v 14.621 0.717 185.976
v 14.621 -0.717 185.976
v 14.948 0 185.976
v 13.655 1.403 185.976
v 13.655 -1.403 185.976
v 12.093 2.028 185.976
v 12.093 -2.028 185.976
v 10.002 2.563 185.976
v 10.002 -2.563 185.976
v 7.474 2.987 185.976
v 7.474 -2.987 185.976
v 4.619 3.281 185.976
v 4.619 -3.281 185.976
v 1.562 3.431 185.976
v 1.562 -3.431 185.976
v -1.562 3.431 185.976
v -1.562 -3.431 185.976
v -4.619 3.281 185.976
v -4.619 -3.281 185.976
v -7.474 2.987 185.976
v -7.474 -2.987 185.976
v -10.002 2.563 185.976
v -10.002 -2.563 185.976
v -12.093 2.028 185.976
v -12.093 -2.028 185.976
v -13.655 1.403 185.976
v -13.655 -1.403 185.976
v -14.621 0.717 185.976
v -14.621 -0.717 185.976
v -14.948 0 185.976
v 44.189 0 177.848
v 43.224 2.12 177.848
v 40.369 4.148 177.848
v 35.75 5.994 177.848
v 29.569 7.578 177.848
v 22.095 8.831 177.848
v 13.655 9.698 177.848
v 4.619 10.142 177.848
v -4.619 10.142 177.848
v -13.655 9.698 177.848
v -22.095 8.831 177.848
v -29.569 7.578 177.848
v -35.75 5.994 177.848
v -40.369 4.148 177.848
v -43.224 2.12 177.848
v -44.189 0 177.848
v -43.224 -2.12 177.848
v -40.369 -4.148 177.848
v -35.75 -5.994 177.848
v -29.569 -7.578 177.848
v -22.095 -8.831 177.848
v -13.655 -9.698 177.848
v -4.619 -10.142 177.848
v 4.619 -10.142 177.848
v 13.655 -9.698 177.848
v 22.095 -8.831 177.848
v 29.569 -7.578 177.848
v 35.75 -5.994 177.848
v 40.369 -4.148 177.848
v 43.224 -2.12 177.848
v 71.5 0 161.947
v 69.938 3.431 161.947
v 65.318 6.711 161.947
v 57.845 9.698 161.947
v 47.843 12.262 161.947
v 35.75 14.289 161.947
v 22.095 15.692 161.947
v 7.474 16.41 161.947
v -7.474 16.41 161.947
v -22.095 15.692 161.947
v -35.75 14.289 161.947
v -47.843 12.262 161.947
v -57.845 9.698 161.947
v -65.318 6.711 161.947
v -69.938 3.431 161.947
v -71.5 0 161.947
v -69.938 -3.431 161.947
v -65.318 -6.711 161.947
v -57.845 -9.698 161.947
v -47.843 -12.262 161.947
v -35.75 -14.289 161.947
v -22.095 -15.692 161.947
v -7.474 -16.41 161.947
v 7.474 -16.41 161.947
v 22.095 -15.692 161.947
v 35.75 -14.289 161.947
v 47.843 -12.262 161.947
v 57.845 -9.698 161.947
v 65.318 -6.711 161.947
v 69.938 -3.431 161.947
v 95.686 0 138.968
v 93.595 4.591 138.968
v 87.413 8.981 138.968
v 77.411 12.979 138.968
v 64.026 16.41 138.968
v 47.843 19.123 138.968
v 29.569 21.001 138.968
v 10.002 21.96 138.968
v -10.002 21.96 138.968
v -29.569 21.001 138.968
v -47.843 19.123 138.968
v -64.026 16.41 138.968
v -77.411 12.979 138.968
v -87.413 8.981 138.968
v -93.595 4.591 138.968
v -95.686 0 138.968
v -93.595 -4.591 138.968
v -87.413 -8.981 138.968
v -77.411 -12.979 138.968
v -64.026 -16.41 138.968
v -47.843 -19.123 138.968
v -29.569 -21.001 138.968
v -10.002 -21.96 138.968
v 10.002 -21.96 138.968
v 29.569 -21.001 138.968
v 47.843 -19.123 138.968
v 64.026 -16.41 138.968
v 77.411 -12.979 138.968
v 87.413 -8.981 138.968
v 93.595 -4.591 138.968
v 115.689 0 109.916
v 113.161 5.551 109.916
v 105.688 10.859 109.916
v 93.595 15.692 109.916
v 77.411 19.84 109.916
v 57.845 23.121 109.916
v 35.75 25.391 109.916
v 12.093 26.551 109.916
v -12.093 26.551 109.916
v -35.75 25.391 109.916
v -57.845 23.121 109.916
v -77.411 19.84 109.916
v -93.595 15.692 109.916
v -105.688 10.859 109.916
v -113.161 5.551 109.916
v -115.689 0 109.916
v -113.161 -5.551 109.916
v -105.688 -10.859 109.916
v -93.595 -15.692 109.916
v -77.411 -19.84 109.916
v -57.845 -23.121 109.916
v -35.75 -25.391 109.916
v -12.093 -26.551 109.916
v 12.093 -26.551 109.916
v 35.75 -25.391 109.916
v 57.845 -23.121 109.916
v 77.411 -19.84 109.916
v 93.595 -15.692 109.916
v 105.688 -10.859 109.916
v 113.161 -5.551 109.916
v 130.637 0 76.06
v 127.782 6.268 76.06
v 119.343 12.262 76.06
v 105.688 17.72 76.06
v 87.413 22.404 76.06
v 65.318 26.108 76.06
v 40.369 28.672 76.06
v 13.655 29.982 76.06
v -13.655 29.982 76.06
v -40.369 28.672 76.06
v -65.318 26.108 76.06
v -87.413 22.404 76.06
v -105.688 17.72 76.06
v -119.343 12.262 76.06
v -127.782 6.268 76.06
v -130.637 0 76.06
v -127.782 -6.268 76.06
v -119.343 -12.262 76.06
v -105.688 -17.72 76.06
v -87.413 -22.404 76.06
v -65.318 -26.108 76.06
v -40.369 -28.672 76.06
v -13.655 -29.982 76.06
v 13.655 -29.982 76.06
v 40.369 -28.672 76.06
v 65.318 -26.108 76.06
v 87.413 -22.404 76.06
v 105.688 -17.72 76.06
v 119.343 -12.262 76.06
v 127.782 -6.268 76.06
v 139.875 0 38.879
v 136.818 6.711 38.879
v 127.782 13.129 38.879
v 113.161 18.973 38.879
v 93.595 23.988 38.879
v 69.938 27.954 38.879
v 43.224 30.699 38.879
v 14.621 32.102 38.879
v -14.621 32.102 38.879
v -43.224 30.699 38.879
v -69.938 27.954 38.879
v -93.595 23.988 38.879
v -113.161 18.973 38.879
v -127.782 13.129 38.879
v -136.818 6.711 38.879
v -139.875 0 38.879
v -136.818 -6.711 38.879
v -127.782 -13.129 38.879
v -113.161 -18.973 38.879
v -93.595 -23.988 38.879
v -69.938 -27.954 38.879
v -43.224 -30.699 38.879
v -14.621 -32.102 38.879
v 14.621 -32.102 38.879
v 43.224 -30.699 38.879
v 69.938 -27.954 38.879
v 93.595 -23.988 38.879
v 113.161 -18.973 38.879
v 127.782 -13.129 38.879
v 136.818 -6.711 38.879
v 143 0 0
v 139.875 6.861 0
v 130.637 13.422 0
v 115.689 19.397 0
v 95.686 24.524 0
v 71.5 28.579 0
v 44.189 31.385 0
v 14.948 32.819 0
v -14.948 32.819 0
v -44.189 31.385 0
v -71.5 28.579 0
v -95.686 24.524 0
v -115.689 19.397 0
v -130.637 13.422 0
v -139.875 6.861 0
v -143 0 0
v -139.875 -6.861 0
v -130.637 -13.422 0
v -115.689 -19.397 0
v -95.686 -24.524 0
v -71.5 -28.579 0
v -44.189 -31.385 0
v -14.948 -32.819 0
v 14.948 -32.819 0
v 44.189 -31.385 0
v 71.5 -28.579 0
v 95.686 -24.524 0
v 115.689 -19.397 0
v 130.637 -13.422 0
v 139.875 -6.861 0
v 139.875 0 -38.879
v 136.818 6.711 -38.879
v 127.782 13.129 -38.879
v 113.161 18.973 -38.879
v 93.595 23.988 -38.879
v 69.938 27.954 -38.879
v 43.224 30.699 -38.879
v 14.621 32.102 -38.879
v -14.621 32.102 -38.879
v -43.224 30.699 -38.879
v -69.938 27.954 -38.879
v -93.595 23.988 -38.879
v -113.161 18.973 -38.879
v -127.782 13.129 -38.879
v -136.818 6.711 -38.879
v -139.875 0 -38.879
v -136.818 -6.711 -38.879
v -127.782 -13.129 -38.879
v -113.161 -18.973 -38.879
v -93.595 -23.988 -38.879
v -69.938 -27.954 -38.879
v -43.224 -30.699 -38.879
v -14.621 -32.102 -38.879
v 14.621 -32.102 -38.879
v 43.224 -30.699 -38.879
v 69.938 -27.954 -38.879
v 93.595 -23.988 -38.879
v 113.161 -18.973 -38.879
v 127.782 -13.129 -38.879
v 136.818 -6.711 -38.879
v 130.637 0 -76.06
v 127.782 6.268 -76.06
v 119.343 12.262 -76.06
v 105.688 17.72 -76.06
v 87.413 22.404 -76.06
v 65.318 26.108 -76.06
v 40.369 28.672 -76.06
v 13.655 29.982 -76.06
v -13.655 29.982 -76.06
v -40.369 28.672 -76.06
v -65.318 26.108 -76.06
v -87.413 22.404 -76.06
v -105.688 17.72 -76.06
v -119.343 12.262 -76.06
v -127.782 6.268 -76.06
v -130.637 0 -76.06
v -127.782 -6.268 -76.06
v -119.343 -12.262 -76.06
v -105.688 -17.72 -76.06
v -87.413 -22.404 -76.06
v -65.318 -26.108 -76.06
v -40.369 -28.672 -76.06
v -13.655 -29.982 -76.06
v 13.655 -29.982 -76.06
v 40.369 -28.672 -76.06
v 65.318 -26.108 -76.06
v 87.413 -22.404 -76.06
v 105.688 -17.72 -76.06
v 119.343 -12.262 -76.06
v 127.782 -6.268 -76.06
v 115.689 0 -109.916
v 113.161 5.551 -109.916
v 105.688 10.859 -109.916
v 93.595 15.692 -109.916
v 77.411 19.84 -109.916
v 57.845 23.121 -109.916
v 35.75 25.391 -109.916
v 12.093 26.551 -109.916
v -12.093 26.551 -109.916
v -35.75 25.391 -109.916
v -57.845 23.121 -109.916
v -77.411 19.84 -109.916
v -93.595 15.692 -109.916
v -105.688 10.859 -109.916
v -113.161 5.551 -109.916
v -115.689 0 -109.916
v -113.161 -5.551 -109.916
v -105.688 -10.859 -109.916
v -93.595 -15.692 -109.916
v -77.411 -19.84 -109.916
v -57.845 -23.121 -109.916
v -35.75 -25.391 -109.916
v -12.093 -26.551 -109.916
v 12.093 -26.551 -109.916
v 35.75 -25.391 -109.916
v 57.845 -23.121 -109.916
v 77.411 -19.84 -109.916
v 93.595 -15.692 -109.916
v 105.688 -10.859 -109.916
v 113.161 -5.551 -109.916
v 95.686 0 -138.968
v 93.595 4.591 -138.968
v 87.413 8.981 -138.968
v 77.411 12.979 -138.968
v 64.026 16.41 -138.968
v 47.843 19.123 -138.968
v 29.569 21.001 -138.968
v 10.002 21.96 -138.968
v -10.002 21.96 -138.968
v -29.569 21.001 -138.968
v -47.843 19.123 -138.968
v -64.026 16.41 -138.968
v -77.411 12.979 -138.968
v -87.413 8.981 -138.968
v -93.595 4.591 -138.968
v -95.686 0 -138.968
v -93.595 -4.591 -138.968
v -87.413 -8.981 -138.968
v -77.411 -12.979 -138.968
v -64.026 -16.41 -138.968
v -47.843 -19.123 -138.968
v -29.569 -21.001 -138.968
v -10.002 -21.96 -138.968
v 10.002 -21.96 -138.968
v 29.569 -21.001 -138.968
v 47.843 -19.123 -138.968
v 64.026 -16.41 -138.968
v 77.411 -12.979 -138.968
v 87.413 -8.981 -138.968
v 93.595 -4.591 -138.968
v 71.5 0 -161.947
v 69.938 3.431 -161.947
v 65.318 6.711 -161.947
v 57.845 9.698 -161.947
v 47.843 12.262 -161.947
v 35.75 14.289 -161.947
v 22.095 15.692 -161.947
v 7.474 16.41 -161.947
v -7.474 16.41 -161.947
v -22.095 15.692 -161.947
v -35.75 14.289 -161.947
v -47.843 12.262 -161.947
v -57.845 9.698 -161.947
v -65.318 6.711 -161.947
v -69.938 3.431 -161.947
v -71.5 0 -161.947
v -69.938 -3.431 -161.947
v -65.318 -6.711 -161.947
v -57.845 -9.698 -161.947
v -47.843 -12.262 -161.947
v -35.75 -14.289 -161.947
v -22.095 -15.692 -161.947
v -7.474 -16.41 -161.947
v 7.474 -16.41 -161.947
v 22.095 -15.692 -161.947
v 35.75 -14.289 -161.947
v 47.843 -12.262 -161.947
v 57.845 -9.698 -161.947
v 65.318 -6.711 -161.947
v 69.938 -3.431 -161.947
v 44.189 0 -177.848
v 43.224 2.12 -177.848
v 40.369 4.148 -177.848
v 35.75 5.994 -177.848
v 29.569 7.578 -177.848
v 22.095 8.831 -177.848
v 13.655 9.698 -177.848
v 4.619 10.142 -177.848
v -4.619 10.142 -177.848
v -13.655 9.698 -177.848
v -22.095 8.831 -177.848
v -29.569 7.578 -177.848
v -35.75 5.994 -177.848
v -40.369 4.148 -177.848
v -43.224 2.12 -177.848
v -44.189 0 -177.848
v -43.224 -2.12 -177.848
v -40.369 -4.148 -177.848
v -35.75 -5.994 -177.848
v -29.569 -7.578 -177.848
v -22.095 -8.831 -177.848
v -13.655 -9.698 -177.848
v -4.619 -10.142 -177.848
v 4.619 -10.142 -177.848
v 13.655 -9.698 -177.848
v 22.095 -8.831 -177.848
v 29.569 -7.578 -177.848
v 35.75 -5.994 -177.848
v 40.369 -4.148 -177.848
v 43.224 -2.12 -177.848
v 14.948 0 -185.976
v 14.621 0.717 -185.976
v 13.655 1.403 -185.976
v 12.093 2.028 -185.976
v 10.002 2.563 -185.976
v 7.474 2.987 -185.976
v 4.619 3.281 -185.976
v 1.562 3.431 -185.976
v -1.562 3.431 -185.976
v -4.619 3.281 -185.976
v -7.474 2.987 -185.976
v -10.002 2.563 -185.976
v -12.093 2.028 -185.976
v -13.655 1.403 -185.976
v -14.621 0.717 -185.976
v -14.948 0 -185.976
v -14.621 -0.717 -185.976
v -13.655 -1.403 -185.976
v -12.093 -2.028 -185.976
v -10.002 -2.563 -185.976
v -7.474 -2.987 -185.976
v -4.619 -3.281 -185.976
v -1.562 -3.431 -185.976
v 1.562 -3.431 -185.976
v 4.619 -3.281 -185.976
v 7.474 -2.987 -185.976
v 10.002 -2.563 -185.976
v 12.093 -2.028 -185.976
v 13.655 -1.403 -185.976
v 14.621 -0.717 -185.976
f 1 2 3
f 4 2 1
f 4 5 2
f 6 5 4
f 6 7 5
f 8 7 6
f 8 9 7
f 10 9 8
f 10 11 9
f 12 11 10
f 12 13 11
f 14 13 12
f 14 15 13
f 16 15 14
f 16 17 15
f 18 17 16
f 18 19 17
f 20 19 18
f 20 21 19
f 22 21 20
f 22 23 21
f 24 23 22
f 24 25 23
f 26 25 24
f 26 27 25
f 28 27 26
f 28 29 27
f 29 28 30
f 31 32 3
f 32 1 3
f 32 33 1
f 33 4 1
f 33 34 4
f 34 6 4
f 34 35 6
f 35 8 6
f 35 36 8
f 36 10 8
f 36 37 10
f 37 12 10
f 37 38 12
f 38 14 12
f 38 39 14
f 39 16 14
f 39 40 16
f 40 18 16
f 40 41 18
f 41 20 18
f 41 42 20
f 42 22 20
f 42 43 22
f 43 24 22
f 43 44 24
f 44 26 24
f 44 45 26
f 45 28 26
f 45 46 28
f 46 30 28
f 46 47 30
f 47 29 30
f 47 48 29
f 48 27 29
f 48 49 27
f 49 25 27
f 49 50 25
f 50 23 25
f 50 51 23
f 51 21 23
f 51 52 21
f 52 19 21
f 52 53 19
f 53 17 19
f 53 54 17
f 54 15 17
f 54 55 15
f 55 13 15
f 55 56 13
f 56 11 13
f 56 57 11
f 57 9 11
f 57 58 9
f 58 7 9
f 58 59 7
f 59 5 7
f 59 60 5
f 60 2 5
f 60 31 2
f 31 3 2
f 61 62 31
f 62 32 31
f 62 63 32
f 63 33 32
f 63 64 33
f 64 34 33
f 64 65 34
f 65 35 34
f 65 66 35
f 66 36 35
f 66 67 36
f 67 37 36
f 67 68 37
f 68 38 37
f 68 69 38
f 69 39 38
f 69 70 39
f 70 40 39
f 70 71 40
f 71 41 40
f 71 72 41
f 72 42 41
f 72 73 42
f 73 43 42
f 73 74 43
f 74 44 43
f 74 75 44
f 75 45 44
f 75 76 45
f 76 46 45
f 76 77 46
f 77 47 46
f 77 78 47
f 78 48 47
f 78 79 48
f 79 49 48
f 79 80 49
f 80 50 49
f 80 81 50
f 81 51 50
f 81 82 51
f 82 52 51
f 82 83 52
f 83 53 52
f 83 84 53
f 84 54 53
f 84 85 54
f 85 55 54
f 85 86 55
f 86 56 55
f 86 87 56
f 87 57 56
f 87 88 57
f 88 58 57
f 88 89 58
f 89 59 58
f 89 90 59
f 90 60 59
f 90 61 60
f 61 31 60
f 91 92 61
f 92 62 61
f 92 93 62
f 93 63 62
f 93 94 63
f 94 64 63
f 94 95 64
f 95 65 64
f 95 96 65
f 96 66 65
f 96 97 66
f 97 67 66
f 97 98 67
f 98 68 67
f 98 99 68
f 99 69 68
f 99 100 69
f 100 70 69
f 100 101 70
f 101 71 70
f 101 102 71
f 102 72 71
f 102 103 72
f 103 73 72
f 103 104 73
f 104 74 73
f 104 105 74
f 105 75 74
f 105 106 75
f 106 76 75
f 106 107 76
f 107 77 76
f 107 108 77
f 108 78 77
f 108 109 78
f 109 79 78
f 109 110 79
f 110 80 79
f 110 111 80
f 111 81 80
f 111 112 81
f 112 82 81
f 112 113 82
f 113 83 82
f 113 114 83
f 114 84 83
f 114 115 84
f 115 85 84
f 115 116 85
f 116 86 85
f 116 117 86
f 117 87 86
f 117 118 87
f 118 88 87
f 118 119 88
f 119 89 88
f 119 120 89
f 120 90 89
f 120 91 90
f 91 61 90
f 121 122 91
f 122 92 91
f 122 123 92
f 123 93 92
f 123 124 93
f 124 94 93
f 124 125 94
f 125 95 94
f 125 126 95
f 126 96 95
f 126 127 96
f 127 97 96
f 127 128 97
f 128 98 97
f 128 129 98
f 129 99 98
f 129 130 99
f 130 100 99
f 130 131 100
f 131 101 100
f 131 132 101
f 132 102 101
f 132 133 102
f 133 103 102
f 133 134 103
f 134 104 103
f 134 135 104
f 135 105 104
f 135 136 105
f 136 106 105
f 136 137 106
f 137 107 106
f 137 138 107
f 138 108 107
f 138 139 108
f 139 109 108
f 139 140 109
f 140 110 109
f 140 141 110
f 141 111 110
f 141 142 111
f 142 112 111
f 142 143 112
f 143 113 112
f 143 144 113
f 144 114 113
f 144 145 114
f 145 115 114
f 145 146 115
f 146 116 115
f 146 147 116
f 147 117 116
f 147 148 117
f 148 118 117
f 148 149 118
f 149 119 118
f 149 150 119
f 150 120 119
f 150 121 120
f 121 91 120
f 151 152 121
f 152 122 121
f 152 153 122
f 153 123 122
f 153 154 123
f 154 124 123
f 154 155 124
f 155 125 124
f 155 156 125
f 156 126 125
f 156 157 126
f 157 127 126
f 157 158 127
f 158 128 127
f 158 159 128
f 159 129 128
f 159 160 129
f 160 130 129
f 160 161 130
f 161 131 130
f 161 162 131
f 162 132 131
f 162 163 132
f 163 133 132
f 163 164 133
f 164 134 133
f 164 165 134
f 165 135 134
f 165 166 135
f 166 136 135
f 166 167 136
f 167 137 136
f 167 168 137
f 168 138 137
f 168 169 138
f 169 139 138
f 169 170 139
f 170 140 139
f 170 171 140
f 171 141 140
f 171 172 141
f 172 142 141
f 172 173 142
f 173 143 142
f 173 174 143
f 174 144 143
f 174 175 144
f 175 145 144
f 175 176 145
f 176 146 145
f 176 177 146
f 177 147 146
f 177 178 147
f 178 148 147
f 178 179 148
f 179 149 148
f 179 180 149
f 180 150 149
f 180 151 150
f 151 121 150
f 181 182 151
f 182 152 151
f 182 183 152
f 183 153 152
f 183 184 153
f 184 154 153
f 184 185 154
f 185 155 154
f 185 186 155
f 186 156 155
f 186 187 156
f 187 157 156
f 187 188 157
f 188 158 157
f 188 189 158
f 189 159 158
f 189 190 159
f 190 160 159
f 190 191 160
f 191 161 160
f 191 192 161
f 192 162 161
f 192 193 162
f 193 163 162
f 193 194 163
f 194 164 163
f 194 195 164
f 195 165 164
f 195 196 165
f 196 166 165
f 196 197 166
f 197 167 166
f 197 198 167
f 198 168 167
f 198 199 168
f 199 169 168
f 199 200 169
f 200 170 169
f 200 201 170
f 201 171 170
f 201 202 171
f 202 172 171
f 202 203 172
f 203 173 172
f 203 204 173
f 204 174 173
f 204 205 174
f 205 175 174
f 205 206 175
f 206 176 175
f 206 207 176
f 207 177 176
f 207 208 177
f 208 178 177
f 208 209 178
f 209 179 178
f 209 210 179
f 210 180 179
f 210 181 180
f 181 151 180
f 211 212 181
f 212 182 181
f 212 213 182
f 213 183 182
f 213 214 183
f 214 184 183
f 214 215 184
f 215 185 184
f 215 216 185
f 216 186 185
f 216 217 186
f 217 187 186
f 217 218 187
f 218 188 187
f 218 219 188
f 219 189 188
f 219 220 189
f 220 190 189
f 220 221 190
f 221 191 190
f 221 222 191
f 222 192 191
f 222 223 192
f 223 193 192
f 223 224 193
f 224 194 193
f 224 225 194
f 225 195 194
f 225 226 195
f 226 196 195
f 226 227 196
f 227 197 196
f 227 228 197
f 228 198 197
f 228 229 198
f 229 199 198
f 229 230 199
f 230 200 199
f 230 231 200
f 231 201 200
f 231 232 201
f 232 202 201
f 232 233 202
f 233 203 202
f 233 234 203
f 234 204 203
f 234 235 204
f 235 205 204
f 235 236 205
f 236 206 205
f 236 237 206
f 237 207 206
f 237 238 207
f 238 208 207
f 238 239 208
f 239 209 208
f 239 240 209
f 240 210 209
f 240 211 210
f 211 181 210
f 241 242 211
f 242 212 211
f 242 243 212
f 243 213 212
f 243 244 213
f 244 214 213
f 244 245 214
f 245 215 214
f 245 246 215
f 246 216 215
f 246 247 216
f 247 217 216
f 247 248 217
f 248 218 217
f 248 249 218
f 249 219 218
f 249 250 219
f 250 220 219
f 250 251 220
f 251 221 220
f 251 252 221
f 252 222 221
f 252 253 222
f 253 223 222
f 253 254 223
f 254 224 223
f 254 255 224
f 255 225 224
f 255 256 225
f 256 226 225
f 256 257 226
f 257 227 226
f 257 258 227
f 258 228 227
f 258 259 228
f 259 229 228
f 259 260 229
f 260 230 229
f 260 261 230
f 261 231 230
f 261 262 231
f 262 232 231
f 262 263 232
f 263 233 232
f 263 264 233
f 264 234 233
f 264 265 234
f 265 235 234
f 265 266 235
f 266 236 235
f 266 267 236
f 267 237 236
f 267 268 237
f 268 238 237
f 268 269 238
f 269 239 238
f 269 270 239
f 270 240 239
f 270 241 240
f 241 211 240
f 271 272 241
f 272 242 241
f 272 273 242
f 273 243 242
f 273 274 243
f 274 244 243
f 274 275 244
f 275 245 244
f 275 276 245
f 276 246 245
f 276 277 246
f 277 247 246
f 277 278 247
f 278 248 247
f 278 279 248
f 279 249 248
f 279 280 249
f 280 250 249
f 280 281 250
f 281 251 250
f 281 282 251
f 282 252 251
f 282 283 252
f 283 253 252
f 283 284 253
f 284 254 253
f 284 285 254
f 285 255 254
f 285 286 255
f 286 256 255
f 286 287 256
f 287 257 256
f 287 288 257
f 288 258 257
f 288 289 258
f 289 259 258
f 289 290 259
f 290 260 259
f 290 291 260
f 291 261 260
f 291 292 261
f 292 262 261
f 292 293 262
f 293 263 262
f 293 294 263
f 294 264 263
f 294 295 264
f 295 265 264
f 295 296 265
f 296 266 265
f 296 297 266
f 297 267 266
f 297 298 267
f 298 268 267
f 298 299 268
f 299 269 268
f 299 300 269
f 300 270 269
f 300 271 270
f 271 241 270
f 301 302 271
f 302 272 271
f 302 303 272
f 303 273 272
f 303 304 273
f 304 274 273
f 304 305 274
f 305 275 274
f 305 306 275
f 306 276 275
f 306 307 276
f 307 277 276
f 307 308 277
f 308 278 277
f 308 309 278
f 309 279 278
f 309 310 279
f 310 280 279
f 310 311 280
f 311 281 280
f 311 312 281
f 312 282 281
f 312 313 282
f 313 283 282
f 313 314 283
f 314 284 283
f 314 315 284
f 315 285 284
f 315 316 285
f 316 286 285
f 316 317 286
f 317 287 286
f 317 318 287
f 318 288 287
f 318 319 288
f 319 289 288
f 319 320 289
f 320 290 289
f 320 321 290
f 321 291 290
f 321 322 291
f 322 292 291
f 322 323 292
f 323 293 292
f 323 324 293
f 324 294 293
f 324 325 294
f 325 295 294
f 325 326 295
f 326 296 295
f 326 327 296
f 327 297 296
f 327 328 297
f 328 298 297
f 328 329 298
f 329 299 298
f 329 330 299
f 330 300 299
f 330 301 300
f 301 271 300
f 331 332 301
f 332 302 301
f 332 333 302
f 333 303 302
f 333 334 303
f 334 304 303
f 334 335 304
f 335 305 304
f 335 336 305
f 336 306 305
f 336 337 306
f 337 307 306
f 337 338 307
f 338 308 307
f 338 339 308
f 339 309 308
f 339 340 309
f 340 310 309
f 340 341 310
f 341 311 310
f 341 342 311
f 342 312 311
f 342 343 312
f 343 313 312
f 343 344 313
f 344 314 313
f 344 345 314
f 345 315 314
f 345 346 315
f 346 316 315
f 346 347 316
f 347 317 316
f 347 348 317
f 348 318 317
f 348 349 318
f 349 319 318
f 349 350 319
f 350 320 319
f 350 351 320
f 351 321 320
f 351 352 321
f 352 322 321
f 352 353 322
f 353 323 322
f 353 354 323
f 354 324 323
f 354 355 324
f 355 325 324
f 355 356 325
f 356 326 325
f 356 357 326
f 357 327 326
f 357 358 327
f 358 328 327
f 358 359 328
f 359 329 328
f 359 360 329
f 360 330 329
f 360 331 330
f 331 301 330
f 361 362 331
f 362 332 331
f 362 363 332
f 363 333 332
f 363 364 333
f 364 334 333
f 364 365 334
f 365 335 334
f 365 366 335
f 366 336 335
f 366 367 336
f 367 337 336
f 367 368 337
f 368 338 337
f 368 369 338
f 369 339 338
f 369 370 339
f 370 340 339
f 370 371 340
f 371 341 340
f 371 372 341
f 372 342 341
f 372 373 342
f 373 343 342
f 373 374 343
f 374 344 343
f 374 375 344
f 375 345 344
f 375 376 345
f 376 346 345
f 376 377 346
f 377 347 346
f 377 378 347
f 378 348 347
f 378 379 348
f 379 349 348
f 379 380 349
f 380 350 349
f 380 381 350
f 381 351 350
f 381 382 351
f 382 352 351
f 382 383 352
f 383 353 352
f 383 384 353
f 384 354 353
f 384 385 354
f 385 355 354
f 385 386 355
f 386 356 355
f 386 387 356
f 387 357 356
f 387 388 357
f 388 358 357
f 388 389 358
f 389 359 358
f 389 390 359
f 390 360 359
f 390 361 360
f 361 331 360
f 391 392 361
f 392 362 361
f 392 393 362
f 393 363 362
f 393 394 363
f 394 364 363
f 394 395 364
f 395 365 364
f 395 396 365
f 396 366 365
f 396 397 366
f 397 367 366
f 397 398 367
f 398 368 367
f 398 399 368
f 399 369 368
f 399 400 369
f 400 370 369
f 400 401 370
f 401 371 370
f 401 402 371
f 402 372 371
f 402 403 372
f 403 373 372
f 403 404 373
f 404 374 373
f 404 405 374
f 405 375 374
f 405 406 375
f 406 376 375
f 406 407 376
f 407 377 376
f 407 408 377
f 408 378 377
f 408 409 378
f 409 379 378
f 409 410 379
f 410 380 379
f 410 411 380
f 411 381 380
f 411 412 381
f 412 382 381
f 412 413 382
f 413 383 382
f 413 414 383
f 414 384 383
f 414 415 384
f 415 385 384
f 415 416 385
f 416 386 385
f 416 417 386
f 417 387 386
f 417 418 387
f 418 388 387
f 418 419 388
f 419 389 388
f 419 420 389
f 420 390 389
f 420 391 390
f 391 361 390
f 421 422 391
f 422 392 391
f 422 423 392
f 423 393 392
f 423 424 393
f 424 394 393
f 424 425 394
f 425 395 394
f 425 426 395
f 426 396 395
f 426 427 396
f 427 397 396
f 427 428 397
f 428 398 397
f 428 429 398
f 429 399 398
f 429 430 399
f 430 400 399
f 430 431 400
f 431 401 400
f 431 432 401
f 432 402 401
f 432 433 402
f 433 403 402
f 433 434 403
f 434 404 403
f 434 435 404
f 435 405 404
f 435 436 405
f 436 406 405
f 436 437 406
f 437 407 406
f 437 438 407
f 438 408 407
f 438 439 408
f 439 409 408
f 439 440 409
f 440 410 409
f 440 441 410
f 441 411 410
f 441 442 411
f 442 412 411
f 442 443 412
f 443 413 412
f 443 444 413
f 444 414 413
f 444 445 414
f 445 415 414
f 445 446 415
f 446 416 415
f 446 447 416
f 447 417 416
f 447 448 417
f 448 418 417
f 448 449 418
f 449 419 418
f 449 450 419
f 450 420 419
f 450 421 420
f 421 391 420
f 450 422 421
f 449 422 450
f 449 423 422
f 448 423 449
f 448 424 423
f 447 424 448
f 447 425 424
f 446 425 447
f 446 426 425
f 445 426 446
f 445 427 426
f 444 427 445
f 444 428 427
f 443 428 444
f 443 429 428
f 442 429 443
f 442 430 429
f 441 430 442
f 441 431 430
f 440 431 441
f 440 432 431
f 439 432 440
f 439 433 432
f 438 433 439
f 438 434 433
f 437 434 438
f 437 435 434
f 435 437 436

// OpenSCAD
// Generated by SolidPython 1.0.1 on 2020-07-29 00:46:50


scale(v = [13, 3, 17]) {
	sphere(r = 11);
}
/***********************************************
*********      SolidPython code:      **********
************************************************
 
# import packages: SolidPython
from solid import *
from solid.utils import *
from itertools import chain, combinations, permutations


class Resize:

    def __init__(self, scad_file):
        self.scad_file = scad_file
        #self.scad_file = import_scad(scad_file)
        # cone/cylinder param:
        self.r1 = 0
        self.r2 = 0
        self.h = 0
        # rectangular prism param:
        self.w = 0
        self.l = 0
        # ellipse param:
        self.r = 0

    # import OpenScad code (file name corresponds to shape)


    # classify shape + parameters
    def assign(self, param1, param2, param3):
        if self.scad_file == 'cone.scad':
            self.r1 = param1
            self.r2 = param2
            self.h = param3
        elif self.scad_file == 'cylinder.scad':
            self.r1 = param1
            self.r2 = param2
            self.h = param3
        elif self.scad_file == 'rectangularPrism.scad':
            self.h = param1
            self.l = param2
            self.w = param3
        else:
            self.r = param1
            self.h = param2

    # resize parameters
    def iterate(self):
        x = range(3, 20, 2)
        i = 1
        if self.scad_file == 'cone.scad':
            tempList = list(permutations(x, 2))
            for temp in tempList:
                param1 = temp[0]
                param2 = temp[1]
                filepath = 'produced_scad_files/' + 'cone' + str(param1) + '_' + str(param2) + '_' + '.scad'
                scad_render_to_file(cylinder(h=param1, r1=param2, r2=0), filepath)

        elif self.scad_file == 'cylinder.scad':
            tempList = list(permutations(x, 3))
            for temp in tempList:
                param1 = temp[0]
                param2 = temp[1]
                filepath = 'produced_scad_files/' + 'cylinder' + str(param1) + '_' + str(param2) + '_' + '.scad'
                scad_render_to_file(cylinder(h=param1, r1=param2, r2=param2), filepath)

        elif self.scad_file == 'rectangularPrism.scad':
            tempList = list(permutations(x, 3))
            for temp in tempList:
                param1 = temp[0]
                param2 = temp[1]
                param3 = temp[2]
                filepath = 'produced_scad_files/' + 'rectangularPrism' + str(param1) + '_' + str(param2) + '_' + str(
                    param3) + '.scad'
                scad_render_to_file(cube(size=(param1, param2, param3)), filepath)

        elif self.scad_file == 'ellipse.scad':
            tempList = list(permutations(x, 4))
            for temp in tempList:
                param1 = temp[0]
                param2 = temp[1]
                param3 = temp[2]
                param4 = temp[3]
                filepath = 'produced_scad_files/' + 'ellipse' + str(param1) + '_' + str(param2) + '_' + str(param3) + '_' + str(param4) + '.scad'
                scad_render_to_file(scale([param1, param2, param3])(sphere(r=param4)), filepath)

    def render_to_scadfile(self):
        scad_render_to_file(scad, 'example.scad') 
 
************************************************/
